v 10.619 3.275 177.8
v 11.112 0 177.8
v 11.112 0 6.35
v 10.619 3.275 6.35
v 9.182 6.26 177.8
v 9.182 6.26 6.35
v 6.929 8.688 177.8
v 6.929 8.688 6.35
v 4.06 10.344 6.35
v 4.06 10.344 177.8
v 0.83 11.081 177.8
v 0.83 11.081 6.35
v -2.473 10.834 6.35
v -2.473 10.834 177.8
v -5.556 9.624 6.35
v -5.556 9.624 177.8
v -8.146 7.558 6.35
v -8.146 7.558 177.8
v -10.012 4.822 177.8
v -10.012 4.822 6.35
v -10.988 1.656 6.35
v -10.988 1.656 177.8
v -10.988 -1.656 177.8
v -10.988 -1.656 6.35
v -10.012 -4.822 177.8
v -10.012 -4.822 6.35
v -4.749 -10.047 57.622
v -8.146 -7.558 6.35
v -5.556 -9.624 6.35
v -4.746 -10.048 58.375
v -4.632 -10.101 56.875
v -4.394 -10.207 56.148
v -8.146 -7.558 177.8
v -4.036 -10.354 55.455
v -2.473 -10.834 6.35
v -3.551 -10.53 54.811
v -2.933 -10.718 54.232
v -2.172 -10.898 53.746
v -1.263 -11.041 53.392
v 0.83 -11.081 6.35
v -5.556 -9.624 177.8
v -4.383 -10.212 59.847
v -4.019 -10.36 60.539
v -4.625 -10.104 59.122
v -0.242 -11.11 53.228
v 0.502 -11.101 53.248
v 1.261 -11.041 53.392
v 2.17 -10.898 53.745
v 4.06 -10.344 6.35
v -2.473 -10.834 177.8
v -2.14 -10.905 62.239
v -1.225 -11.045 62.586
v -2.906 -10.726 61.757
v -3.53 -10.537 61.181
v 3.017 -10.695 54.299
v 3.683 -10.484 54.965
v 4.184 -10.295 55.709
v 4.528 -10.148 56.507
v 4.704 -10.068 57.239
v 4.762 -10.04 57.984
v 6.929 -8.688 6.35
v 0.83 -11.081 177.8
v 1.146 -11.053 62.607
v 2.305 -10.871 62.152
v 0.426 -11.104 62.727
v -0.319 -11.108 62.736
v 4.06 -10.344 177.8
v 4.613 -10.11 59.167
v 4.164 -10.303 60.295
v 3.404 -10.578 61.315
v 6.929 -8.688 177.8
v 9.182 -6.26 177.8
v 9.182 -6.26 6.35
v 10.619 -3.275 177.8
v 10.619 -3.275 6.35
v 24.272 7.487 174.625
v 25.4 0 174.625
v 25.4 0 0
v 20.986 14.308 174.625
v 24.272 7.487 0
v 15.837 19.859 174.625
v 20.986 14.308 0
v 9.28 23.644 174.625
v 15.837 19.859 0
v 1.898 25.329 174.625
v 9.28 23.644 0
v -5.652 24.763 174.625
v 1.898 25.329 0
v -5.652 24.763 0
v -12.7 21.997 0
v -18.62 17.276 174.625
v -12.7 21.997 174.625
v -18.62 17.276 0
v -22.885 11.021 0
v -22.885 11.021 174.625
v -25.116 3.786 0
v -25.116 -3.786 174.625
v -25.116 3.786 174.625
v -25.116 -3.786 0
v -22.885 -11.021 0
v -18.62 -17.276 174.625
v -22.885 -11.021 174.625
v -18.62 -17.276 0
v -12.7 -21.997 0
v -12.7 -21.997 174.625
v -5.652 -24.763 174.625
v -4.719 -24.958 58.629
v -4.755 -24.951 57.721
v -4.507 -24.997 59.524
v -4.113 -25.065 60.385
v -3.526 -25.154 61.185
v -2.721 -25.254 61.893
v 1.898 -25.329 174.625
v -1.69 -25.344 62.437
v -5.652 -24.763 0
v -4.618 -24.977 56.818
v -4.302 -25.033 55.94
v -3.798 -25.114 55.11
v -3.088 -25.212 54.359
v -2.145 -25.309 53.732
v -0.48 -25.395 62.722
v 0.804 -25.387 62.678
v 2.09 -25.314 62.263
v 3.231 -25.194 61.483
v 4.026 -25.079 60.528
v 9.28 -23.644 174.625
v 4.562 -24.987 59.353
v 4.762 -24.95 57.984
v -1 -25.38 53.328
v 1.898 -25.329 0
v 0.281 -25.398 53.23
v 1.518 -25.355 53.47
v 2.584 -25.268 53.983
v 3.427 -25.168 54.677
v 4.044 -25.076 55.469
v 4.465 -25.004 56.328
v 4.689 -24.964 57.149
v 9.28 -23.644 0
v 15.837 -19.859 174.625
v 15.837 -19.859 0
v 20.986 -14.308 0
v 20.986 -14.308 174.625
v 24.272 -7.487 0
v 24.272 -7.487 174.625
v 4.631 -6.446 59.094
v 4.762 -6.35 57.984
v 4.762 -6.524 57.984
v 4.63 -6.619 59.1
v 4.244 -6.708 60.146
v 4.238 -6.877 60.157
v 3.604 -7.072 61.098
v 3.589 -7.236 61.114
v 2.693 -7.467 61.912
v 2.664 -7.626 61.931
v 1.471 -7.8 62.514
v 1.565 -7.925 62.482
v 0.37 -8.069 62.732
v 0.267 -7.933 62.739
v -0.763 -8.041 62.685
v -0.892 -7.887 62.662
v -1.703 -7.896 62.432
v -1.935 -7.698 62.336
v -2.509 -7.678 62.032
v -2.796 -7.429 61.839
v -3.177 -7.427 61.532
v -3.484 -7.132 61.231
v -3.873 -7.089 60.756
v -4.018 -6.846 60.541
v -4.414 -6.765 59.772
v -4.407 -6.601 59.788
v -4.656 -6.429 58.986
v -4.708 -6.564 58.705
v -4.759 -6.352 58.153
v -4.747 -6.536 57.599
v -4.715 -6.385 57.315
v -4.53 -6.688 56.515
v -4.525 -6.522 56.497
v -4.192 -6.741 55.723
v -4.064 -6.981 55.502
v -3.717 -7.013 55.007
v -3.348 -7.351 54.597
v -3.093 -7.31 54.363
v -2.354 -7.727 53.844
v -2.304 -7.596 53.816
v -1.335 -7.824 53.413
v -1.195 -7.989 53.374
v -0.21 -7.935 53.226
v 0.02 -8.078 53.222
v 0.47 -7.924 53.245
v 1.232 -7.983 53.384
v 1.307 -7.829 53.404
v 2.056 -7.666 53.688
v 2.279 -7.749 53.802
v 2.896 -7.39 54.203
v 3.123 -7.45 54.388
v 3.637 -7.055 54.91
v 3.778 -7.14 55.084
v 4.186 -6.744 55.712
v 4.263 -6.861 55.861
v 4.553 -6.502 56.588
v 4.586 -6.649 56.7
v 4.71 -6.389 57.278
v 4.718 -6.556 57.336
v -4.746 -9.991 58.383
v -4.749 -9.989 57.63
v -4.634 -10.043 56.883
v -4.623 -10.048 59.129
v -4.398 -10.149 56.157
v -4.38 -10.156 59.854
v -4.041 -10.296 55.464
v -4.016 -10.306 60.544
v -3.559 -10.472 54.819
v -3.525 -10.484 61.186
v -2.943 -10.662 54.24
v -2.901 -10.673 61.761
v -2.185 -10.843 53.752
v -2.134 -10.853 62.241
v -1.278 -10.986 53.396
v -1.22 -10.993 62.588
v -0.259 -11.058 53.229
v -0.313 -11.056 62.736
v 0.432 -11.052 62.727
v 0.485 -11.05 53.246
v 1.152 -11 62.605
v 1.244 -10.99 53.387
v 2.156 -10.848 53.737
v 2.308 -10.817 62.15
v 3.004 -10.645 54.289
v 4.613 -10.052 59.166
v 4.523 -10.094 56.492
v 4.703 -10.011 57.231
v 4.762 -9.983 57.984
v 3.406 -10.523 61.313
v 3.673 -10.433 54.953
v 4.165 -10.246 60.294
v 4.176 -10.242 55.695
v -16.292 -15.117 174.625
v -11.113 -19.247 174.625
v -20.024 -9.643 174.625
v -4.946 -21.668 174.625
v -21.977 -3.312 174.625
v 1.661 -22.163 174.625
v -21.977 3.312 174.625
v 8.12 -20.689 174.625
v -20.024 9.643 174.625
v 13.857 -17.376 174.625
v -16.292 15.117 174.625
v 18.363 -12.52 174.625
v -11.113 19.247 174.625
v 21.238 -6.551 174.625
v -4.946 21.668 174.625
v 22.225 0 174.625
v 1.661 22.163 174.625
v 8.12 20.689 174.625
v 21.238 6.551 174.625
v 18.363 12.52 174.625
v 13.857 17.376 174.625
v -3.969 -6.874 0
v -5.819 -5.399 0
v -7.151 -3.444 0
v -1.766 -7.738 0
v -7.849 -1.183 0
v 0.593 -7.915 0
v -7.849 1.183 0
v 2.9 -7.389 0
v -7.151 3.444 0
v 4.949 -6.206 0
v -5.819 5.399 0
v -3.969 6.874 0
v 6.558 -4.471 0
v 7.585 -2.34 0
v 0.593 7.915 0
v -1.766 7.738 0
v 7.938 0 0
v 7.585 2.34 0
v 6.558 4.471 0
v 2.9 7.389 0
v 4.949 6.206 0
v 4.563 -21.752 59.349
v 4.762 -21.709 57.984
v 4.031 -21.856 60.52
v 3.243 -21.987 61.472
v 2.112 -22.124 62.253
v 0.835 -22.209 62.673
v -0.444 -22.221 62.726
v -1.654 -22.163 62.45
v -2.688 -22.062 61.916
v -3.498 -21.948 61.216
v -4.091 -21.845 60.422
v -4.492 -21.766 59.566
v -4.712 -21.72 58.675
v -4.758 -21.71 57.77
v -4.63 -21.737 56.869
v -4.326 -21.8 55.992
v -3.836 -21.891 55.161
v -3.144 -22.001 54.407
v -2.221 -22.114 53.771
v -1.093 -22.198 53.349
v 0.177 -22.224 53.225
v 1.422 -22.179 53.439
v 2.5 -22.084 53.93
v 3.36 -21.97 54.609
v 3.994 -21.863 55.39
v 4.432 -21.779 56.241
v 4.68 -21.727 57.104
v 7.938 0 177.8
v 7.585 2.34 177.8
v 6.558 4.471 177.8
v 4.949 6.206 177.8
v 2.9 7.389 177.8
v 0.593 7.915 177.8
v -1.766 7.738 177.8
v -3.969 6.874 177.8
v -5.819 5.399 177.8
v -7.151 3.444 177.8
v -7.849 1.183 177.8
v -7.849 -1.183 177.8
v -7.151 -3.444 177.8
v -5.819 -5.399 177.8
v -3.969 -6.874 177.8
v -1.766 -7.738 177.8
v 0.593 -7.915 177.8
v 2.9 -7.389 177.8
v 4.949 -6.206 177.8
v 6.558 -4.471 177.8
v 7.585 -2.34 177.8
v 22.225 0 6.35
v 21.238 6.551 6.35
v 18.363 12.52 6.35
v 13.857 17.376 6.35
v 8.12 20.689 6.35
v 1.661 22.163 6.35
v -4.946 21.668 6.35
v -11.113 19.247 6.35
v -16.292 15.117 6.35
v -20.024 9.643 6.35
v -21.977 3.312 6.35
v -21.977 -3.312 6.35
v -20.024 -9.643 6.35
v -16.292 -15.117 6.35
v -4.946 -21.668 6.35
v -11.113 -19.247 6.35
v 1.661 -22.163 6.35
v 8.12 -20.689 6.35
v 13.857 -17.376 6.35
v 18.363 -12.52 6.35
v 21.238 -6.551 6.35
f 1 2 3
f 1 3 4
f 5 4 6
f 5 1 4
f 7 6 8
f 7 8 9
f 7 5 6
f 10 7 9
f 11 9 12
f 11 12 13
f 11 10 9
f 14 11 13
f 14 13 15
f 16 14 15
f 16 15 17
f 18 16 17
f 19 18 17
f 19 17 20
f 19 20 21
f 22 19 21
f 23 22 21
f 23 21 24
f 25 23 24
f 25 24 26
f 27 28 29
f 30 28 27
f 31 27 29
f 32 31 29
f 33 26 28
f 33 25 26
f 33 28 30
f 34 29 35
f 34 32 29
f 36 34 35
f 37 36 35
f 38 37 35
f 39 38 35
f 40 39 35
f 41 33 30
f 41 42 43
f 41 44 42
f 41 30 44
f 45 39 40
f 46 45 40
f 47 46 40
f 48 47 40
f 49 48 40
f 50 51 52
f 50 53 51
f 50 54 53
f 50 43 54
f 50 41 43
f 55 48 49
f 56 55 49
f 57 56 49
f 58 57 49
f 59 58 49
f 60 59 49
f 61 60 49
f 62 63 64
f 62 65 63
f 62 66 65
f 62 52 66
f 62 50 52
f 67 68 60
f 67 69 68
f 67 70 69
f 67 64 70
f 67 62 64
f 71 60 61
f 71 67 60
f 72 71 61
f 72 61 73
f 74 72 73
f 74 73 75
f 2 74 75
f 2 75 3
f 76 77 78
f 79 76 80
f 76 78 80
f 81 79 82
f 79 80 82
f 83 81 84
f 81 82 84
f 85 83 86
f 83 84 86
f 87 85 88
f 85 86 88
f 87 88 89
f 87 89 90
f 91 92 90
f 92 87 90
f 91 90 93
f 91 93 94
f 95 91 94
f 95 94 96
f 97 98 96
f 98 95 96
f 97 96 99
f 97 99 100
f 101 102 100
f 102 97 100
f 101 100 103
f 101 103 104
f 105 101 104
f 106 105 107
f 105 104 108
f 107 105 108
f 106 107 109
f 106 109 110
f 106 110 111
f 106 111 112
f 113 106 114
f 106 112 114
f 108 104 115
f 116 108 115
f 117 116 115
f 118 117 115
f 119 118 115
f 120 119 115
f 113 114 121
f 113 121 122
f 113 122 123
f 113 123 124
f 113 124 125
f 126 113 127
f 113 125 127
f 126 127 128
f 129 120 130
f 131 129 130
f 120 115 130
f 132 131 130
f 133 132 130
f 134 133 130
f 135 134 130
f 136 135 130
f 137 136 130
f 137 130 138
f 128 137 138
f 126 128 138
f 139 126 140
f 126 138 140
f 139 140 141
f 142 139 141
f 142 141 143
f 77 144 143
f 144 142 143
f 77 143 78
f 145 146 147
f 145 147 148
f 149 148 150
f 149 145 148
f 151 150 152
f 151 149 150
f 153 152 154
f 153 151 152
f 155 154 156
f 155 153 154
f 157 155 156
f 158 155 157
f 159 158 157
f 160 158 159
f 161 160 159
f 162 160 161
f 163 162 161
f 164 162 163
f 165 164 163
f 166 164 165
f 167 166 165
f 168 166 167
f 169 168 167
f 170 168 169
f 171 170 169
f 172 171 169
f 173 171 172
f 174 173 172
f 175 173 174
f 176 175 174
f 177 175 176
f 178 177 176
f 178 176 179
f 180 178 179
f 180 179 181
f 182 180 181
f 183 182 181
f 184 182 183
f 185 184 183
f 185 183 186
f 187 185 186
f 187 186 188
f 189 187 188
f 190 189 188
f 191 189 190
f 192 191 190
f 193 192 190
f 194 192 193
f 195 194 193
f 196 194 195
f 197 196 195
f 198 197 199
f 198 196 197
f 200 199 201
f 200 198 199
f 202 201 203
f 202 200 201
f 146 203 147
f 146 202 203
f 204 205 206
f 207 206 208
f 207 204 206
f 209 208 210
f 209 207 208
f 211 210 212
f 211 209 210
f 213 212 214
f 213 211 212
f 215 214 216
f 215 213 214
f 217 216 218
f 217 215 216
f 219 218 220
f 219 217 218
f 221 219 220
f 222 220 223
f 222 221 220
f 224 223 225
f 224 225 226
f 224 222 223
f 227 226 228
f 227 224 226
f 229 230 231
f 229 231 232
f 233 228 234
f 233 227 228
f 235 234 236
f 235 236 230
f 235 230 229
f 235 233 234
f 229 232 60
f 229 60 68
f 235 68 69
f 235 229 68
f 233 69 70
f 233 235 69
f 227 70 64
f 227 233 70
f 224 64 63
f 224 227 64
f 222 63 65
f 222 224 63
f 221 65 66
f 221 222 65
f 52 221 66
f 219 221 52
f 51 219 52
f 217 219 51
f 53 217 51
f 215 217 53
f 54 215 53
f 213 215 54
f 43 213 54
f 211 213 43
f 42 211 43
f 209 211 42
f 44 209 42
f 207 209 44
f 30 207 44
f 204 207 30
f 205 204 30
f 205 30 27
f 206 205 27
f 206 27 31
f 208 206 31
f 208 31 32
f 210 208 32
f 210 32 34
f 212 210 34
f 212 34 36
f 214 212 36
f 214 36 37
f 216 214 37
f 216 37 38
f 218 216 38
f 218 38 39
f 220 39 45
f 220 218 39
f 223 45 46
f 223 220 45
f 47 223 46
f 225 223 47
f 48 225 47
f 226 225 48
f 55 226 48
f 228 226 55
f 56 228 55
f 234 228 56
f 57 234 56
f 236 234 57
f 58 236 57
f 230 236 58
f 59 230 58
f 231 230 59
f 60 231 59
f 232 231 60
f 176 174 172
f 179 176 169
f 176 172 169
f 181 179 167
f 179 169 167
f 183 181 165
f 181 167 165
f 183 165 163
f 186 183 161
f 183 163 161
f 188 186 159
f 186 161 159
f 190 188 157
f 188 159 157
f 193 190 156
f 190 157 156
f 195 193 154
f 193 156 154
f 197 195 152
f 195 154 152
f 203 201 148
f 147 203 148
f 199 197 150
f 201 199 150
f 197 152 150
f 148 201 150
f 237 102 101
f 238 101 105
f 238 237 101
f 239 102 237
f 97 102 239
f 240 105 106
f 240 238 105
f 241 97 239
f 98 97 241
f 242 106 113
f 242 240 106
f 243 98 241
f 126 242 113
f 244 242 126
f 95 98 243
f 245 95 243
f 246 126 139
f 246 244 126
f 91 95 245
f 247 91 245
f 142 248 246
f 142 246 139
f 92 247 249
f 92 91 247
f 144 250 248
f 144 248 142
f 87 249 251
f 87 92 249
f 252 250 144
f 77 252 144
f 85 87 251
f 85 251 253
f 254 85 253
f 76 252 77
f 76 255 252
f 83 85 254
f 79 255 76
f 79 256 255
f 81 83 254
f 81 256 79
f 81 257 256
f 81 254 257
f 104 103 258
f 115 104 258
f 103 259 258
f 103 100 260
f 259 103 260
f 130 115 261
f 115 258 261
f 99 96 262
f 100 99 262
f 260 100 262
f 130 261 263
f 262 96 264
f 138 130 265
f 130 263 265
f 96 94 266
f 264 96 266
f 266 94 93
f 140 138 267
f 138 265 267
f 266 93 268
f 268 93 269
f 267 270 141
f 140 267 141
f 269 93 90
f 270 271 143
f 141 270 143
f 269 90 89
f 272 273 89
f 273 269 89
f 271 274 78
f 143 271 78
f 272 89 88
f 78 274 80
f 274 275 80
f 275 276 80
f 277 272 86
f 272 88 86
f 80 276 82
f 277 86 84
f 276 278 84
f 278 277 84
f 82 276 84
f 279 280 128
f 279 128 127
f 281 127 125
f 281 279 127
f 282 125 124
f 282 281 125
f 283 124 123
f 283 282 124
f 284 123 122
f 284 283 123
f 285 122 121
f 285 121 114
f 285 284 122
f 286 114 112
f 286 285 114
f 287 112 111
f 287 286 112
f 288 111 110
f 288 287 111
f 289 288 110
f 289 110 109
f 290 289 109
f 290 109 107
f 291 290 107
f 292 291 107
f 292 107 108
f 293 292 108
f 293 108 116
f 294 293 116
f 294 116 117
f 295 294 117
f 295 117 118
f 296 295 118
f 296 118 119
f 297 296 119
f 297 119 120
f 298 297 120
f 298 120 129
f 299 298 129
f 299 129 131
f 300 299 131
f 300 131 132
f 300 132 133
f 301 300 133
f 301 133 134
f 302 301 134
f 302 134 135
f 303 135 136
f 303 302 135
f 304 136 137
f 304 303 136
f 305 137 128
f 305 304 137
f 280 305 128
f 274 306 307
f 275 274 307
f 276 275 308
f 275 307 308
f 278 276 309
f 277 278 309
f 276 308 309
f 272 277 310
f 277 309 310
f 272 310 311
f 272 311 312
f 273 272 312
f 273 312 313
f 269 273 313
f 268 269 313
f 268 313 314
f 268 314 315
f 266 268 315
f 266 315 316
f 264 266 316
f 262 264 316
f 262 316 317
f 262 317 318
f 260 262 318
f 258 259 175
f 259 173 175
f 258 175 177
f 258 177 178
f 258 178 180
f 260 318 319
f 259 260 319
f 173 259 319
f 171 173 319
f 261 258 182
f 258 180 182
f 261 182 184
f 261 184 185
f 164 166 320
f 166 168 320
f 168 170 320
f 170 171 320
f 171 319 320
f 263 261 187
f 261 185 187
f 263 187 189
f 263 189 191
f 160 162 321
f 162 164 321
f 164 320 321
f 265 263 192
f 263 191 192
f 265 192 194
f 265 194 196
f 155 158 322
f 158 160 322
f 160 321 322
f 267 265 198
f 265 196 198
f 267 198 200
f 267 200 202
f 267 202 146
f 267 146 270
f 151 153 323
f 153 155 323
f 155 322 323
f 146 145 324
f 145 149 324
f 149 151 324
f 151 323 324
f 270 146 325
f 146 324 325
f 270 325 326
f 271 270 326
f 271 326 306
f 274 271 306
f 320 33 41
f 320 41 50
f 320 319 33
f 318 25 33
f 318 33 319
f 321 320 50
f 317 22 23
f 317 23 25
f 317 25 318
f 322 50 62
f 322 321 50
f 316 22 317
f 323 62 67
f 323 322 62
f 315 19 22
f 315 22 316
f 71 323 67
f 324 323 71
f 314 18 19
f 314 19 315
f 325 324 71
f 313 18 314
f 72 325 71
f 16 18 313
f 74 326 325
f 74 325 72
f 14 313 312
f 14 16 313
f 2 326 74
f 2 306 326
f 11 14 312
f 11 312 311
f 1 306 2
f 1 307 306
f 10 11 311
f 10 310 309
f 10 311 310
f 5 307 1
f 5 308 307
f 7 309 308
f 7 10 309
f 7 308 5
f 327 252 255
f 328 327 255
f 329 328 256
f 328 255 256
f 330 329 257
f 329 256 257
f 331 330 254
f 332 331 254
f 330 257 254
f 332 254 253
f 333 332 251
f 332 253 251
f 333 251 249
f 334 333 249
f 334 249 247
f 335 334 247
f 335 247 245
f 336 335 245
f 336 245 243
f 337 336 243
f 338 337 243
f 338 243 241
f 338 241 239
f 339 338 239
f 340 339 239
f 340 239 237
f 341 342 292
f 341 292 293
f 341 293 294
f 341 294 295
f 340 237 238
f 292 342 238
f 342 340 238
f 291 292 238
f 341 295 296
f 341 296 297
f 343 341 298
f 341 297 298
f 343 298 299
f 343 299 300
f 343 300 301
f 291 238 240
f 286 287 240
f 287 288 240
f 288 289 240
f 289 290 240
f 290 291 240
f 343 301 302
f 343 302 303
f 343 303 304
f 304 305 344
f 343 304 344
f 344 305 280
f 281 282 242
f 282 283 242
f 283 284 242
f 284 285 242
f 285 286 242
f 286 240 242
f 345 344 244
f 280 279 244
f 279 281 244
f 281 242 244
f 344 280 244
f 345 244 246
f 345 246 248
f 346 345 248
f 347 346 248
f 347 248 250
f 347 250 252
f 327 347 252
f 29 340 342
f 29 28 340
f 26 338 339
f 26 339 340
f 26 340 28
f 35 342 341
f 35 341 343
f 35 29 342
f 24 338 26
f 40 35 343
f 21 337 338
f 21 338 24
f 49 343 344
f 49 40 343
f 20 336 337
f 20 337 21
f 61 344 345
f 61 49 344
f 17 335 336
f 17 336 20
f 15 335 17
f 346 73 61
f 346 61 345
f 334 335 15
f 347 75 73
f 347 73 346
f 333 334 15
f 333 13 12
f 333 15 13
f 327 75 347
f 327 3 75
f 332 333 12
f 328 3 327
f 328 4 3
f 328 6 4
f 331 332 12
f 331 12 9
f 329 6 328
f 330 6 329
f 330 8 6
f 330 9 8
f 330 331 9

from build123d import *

# Parameters (mm, degrees)
F0_R      = 25.4
F1_DEPTH  = 177.8
F2_R      = 7.9375
F3_DEPTH  = 240.792
F4_R      = 22.225
F4_R_2    = 11.1125
F5_DEPTH  = 171.45
F6_R      = 28.604264
F6_R_2    = 14.624006
F7_DEPTH  = 3.175
F8_R      = 4.7625
F9_DEPTH  = 34.544
F10_R     = 11.060578
F10_R_2   = 8.077609
F11_DEPTH = 130.556


with BuildPart() as f1:
    # F0 (on Top) → F1 (new body)
    with BuildSketch(Plane.XY):
        Circle(F0_R)
    extrude(amount=F1_DEPTH)

    # F2 (on face) → F3 (cut)
    with BuildSketch(Plane.XY.offset(177.8)):
        Circle(F2_R)
    extrude(amount=-F3_DEPTH, mode=Mode.SUBTRACT)

    # F4 (on face) → F5 (cut)
    with BuildSketch(Plane.XY.offset(177.8)):
        Circle(F4_R)
        Circle(F4_R_2, mode=Mode.SUBTRACT)
    extrude(amount=-F5_DEPTH, mode=Mode.SUBTRACT)

    # F6 (on face) → F7 (cut)
    with BuildSketch(Plane.XY.offset(177.8)):
        Circle(F6_R)
        Circle(F6_R_2, mode=Mode.SUBTRACT)
    extrude(amount=-F7_DEPTH, mode=Mode.SUBTRACT)

    # F8 (on Front) → F9 (cut)
    with BuildSketch(Plane.XZ):
        with Locations((0, 57.984043)):
            Circle(F8_R)
    extrude(amount=F9_DEPTH, mode=Mode.SUBTRACT)

    # F10 (on face) → F11 (join)
    with BuildSketch(Plane.XY.offset(177.8)):
        Circle(F10_R)
        Circle(F10_R_2, mode=Mode.SUBTRACT)
    extrude(amount=-F11_DEPTH)


solid = f1.part
